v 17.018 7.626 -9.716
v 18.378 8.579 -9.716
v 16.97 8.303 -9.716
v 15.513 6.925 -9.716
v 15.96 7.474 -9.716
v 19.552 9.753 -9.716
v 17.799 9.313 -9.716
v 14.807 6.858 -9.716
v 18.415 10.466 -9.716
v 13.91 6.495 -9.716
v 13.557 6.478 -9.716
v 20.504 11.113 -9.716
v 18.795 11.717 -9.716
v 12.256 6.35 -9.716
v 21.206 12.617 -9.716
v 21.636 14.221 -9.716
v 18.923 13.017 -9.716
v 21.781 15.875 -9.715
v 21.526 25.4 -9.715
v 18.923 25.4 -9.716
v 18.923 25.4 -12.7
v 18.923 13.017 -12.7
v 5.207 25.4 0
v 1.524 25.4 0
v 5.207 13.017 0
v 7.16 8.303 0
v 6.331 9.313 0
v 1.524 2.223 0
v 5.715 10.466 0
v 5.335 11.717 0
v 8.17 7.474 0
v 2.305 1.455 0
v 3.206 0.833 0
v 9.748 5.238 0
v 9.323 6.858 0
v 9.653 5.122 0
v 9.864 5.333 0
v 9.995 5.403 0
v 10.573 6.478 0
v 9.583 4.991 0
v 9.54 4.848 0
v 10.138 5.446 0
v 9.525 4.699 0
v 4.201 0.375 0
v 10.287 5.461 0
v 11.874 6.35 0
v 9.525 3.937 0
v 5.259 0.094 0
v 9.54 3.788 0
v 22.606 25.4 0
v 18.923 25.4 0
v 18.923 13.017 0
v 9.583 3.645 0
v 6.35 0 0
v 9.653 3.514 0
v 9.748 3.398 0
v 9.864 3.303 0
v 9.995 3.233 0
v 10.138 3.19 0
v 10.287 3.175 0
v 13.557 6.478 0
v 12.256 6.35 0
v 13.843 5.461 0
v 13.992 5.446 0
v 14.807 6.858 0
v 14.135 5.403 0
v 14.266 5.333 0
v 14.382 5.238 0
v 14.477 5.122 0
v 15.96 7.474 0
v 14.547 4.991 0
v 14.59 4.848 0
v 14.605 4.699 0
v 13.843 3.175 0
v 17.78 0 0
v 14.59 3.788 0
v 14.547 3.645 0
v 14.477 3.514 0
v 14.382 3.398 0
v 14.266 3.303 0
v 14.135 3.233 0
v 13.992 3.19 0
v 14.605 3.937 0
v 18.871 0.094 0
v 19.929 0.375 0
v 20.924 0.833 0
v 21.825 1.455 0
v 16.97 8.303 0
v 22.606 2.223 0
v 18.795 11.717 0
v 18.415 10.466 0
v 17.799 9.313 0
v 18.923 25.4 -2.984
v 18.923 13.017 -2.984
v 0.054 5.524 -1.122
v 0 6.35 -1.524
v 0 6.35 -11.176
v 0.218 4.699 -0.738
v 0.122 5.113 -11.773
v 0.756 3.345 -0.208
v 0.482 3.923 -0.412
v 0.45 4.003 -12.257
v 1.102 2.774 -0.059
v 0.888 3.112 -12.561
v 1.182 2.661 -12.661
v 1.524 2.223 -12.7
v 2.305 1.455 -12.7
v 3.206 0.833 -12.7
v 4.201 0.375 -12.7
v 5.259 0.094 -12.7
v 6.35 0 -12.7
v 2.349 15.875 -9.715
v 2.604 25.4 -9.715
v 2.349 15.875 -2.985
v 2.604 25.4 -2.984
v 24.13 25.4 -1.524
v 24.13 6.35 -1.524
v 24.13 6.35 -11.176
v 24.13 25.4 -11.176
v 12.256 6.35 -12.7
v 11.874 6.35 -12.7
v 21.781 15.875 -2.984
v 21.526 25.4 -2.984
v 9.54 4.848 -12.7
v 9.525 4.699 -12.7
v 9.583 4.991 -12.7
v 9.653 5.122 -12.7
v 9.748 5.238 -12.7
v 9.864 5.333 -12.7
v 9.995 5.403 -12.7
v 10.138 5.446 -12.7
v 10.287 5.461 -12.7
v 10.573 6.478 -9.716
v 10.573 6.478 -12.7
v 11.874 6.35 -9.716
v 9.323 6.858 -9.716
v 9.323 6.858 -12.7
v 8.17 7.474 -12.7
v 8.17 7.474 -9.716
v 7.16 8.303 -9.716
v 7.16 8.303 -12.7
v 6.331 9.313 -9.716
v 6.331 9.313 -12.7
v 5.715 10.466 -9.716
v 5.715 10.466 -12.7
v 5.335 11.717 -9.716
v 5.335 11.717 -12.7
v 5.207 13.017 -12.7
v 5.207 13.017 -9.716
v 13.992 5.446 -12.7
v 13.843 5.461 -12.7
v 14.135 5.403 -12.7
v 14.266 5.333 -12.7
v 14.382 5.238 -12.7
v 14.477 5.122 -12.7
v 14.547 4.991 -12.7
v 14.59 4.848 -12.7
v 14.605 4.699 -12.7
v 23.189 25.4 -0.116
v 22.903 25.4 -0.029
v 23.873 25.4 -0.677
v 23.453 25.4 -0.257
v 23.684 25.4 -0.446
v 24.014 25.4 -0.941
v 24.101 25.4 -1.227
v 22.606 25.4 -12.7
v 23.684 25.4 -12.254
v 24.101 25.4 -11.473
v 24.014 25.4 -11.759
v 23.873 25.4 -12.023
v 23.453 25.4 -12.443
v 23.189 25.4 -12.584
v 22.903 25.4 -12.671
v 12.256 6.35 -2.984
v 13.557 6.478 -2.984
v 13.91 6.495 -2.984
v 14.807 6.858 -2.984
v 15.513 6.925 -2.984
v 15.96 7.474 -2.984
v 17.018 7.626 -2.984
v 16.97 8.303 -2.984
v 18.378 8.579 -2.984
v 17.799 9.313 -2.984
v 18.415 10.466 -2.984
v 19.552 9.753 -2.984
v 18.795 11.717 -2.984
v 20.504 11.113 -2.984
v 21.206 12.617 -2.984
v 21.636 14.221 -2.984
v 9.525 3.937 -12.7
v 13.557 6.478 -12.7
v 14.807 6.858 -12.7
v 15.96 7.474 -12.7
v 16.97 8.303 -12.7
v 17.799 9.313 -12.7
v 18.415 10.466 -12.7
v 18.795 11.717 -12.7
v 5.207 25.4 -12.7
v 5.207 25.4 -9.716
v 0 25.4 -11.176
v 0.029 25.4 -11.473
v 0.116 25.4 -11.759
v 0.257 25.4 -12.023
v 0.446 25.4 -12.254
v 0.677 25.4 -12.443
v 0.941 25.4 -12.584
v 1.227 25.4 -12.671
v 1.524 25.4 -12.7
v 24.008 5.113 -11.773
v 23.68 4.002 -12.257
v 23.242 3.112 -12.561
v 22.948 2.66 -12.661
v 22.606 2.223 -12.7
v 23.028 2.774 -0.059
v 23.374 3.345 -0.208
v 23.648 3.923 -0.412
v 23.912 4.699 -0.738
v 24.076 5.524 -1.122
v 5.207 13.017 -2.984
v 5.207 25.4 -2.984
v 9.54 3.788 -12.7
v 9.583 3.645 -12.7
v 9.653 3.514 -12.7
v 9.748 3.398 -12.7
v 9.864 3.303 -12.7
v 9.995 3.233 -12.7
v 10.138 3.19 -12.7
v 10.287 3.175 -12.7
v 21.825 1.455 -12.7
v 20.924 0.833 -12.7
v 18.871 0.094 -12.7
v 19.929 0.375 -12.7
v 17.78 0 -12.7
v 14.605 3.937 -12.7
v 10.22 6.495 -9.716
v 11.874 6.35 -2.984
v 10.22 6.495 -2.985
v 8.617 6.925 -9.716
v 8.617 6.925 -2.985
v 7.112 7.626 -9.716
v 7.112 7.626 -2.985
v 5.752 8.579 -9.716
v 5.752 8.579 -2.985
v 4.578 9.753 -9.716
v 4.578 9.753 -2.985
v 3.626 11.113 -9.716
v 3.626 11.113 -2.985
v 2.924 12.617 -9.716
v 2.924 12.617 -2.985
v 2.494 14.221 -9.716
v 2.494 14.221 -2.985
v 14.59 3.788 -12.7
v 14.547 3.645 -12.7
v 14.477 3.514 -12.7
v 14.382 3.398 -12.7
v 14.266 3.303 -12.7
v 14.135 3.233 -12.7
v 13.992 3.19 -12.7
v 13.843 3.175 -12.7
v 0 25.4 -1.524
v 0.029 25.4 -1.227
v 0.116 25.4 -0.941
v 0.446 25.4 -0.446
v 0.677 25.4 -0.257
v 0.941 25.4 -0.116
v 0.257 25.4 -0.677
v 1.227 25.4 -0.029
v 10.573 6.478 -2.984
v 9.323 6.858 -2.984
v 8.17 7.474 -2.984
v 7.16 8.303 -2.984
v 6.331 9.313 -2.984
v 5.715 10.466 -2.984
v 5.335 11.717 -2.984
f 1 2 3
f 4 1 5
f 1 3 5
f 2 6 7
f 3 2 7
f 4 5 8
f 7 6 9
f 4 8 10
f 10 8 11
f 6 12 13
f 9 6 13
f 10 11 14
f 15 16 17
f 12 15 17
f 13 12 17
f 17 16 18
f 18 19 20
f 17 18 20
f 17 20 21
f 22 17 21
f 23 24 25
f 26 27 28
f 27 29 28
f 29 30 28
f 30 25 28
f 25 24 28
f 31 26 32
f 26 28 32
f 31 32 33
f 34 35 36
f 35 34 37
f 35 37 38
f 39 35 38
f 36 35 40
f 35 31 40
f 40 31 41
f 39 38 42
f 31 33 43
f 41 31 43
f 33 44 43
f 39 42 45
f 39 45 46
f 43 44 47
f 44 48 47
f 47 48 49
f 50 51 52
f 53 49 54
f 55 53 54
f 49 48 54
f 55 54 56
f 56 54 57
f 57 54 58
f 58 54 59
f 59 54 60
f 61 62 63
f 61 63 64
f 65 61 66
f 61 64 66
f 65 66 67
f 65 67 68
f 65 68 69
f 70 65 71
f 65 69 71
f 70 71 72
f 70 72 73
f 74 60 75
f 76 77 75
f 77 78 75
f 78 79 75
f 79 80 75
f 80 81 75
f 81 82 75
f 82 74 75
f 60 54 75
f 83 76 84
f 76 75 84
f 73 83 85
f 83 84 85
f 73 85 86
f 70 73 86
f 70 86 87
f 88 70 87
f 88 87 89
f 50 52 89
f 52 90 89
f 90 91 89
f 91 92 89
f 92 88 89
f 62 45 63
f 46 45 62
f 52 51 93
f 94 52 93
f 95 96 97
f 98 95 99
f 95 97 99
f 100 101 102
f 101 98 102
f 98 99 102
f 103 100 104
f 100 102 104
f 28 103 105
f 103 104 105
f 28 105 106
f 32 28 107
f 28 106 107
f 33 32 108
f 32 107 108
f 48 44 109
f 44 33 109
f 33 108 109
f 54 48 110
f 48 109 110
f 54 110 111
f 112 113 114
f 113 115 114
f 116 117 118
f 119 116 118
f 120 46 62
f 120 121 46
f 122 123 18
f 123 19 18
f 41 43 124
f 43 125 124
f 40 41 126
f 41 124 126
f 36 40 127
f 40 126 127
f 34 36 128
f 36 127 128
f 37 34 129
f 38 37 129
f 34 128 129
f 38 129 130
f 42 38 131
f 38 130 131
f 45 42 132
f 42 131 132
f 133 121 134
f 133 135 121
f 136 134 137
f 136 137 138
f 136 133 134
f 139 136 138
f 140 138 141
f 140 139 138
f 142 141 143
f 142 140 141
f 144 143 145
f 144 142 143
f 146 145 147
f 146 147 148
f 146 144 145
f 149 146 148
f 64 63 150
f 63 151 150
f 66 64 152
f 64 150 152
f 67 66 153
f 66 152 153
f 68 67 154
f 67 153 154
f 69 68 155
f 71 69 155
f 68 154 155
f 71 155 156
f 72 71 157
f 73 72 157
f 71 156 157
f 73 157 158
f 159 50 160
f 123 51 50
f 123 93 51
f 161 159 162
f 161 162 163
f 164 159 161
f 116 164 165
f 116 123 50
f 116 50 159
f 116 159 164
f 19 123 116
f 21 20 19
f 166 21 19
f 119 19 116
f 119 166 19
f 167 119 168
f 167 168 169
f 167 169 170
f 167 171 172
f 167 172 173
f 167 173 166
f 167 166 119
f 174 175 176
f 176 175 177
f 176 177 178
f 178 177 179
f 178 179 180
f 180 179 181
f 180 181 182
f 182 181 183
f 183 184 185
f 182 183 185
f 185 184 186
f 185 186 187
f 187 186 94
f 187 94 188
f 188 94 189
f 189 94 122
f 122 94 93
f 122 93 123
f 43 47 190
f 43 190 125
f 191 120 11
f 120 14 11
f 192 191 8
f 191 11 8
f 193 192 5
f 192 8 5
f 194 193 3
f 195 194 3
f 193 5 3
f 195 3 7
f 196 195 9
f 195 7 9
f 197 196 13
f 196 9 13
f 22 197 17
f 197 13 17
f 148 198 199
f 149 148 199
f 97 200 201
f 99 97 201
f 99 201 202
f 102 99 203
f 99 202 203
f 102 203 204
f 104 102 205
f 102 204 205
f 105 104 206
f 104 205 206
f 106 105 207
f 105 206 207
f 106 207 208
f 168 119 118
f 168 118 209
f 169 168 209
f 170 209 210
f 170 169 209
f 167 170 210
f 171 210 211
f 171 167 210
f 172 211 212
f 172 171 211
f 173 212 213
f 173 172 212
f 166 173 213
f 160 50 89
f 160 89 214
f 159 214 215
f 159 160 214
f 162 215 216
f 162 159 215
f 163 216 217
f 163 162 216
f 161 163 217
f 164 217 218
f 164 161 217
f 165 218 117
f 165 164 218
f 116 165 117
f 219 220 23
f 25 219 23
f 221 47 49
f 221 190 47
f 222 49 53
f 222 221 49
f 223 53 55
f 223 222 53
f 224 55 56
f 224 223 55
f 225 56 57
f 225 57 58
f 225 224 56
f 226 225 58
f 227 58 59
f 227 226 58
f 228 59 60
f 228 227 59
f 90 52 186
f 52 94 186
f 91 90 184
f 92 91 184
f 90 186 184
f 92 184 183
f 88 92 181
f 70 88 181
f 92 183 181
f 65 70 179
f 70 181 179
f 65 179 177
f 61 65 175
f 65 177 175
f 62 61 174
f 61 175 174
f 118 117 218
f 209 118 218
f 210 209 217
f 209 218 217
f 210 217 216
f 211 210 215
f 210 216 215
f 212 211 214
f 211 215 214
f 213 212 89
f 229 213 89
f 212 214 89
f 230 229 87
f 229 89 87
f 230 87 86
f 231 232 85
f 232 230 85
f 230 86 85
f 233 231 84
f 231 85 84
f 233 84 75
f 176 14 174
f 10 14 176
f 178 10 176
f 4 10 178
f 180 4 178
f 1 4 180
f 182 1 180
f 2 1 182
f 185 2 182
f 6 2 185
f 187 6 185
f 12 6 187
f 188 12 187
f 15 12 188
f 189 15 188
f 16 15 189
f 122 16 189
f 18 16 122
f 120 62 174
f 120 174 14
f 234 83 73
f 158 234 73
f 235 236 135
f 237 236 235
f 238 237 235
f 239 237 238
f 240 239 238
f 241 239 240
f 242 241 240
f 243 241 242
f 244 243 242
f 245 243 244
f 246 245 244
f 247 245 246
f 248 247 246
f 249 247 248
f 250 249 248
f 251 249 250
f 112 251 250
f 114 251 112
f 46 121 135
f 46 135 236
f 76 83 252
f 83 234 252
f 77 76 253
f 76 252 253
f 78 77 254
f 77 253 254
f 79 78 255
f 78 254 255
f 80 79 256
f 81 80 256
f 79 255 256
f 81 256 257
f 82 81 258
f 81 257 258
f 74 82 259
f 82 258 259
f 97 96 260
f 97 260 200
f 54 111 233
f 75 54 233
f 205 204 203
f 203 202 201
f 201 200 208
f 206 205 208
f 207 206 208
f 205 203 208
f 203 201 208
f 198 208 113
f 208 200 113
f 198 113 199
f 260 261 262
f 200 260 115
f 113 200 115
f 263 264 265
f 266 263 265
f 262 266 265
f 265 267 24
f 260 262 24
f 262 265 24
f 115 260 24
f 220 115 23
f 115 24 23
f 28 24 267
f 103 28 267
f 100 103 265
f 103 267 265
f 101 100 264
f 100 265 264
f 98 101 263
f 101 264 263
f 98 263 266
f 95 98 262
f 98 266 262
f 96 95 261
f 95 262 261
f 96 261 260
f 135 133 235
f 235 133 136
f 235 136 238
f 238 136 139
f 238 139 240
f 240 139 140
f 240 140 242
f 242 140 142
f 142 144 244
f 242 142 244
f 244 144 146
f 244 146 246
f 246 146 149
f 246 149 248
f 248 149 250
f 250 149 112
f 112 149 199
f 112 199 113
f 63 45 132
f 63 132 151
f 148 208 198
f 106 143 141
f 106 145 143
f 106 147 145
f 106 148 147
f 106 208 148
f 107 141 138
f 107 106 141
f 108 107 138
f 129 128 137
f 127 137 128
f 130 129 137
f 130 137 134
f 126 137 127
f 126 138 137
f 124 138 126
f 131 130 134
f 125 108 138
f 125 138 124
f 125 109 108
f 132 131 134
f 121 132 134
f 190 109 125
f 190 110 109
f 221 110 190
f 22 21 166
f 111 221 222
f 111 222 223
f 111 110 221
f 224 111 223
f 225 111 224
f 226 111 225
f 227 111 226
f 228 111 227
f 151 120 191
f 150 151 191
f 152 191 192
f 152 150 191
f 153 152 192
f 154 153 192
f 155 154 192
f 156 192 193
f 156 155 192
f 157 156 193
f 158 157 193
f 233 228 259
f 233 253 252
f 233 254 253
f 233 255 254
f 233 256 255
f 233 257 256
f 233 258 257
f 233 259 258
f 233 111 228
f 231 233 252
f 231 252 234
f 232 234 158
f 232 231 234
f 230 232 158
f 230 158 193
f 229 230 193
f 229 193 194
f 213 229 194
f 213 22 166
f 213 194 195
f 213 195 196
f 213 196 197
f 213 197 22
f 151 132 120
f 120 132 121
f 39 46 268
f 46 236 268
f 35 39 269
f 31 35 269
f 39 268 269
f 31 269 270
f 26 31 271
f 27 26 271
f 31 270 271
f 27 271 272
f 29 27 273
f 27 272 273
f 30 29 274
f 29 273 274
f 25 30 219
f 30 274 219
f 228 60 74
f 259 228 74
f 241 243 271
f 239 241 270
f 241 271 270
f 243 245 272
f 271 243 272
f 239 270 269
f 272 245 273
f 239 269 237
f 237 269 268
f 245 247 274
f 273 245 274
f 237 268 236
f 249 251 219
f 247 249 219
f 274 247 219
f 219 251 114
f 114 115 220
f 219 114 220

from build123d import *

# Parameters (mm, degrees)
SKETCH1_W                      = 24.13
SKETCH1_H                      = 12.7
BOSS_EXTRUDE1_DEPTH            = 25.4
CUT_EXTRUDE2_DEPTH             = 19.05
FILLET1_R                      = 9.525
FILLET2_R                      = 6.6675
BOSS_EXTRUDE2_DEPTH            = 3.3655
CUT_EXTRUDE3_REACH             = 39.265
SKETCH4_W                      = 5.08
SKETCH4_H                      = 2.286
CUT_EXTRUDE3_DIRECTION_2_DEPTH = 38.265357908
FILLET3_R                      = 0.762
FILLET4_R                      = 1.524
FILLET5_R                      = 6.35


# Some blends are built 0.0001 mm under size
with BuildPart() as part:
    # Sketch1 → Boss-Extrude1 (new body)
    with BuildSketch(Plane(origin=(0, 0, 0), x_dir=(1, 0, 0), z_dir=(0, 1, 0))):
        with Locations((12.065, 6.35)):
            Rectangle(SKETCH1_W, SKETCH1_H)
    extrude(amount=BOSS_EXTRUDE1_DEPTH)

    # Sketch2 → Cut-Extrude2 (cut)
    with BuildSketch(Plane(origin=(0, 25.4, 0), x_dir=(1, 0, 0), z_dir=(0, 1, 0))):
        Polygon((2.3495, 2.9845), (5.207, 2.9845), (5.207, 0), (18.923, 0), (18.923, 2.9845), (21.7805, 2.9845), (21.7805, 9.7155), (18.923, 9.7155), (18.923, 12.7), (5.207, 12.7), (5.207, 9.7155), (2.3495, 9.7155), align=None)
    extrude(amount=-CUT_EXTRUDE2_DEPTH, mode=Mode.SUBTRACT)

    # Fillet1
    fillet1_edges = [part.edges().sort_by_distance(p)[0] for p in [
        (21.7805, 6.35, -6.35),
        (2.3495, 6.35, -6.35),
    ]]
    fillet(fillet1_edges, radius=FILLET1_R)

    # Fillet2
    fillet2_edges = [part.edges().sort_by_distance(p)[0] for p in [
        (5.207, 9.072789422, -11.20775),
        (18.923, 9.072789422, -11.20775),
        (18.923, 9.072789422, -1.49225),
        (5.207, 9.072789422, -1.49225),
    ]]
    fillet(fillet2_edges, radius=FILLET2_R - 0.0001)  # a hair under: the kernel refuses the full size

    # Sketch3 → Boss-Extrude2 (add, symmetric)
    with BuildSketch(Plane.XY.offset(-6.35)):
        Polygon((21.7805, 25.4), (21.5265, 25.4), (21.7805, 15.875), align=None)
        Polygon((2.3495, 25.4), (2.6035, 25.4), (2.3495, 15.875), align=None)
    extrude(amount=BOSS_EXTRUDE2_DEPTH, both=True)

    # Sketch4 → Cut-Extrude3 (cut, up to next)
    with BuildSketch(Plane.XY, mode=Mode.PRIVATE) as cut_extrude3_sk1:
        with Locations((12.065, 4.318)):
            Rectangle(SKETCH4_W, SKETCH4_H)
    cut_extrude3_tool1 = extrude(cut_extrude3_sk1.sketch, amount=-CUT_EXTRUDE3_REACH, mode=Mode.PRIVATE) & part.part
    add(cut_extrude3_tool1.solids().sort_by_distance((12.065, 4.318, 0))[0], mode=Mode.SUBTRACT)

    # Sketch4 → Cut-Extrude3 direction 2 (cut)
    with BuildSketch(Plane.XY):
        with Locations((12.065, 4.318)):
            Rectangle(SKETCH4_W, SKETCH4_H)
    extrude(amount=CUT_EXTRUDE3_DIRECTION_2_DEPTH, mode=Mode.SUBTRACT)

    # Fillet3
    fillet3_edges = [part.edges().sort_by_distance(p)[0] for p in [
        (9.525, 5.461, -6.35),
        (9.525, 3.175, -6.35),
        (14.605, 3.175, -6.35),
        (14.605, 5.461, -6.35),
    ]]
    fillet(fillet3_edges, radius=FILLET3_R)

    # Fillet4
    fillet4_edges = [part.edges().sort_by_distance(p)[0] for p in [
        (0, 12.7, -12.7),
        (24.13, 12.7, -12.7),
        (24.13, 12.7, 0),
        (0, 12.7, 0),
    ]]
    fillet(fillet4_edges, radius=FILLET4_R)

    # Fillet5
    # the kernel refuses this fillet: 6.35 mm, written as the material it takes off along each edge
    with BuildSketch(Plane(origin=(24.13, 0, 14.351), x_dir=(-1, 0, 0), z_dir=(0, 0, -1)), Plane(origin=(0, 0, -27.051), x_dir=(1, 0, 0), z_dir=(0, 0, 1))) as fillet5_piece_1:
        with BuildLine():
            CenterArc((FILLET5_R, FILLET5_R), FILLET5_R, 180, 90)
            Line((0, FILLET5_R), (0, 0))
            Line((0, 0), (FILLET5_R, 0))
        make_face()
    extrude(amount=41.402, mode=Mode.SUBTRACT)


solid = part.part
